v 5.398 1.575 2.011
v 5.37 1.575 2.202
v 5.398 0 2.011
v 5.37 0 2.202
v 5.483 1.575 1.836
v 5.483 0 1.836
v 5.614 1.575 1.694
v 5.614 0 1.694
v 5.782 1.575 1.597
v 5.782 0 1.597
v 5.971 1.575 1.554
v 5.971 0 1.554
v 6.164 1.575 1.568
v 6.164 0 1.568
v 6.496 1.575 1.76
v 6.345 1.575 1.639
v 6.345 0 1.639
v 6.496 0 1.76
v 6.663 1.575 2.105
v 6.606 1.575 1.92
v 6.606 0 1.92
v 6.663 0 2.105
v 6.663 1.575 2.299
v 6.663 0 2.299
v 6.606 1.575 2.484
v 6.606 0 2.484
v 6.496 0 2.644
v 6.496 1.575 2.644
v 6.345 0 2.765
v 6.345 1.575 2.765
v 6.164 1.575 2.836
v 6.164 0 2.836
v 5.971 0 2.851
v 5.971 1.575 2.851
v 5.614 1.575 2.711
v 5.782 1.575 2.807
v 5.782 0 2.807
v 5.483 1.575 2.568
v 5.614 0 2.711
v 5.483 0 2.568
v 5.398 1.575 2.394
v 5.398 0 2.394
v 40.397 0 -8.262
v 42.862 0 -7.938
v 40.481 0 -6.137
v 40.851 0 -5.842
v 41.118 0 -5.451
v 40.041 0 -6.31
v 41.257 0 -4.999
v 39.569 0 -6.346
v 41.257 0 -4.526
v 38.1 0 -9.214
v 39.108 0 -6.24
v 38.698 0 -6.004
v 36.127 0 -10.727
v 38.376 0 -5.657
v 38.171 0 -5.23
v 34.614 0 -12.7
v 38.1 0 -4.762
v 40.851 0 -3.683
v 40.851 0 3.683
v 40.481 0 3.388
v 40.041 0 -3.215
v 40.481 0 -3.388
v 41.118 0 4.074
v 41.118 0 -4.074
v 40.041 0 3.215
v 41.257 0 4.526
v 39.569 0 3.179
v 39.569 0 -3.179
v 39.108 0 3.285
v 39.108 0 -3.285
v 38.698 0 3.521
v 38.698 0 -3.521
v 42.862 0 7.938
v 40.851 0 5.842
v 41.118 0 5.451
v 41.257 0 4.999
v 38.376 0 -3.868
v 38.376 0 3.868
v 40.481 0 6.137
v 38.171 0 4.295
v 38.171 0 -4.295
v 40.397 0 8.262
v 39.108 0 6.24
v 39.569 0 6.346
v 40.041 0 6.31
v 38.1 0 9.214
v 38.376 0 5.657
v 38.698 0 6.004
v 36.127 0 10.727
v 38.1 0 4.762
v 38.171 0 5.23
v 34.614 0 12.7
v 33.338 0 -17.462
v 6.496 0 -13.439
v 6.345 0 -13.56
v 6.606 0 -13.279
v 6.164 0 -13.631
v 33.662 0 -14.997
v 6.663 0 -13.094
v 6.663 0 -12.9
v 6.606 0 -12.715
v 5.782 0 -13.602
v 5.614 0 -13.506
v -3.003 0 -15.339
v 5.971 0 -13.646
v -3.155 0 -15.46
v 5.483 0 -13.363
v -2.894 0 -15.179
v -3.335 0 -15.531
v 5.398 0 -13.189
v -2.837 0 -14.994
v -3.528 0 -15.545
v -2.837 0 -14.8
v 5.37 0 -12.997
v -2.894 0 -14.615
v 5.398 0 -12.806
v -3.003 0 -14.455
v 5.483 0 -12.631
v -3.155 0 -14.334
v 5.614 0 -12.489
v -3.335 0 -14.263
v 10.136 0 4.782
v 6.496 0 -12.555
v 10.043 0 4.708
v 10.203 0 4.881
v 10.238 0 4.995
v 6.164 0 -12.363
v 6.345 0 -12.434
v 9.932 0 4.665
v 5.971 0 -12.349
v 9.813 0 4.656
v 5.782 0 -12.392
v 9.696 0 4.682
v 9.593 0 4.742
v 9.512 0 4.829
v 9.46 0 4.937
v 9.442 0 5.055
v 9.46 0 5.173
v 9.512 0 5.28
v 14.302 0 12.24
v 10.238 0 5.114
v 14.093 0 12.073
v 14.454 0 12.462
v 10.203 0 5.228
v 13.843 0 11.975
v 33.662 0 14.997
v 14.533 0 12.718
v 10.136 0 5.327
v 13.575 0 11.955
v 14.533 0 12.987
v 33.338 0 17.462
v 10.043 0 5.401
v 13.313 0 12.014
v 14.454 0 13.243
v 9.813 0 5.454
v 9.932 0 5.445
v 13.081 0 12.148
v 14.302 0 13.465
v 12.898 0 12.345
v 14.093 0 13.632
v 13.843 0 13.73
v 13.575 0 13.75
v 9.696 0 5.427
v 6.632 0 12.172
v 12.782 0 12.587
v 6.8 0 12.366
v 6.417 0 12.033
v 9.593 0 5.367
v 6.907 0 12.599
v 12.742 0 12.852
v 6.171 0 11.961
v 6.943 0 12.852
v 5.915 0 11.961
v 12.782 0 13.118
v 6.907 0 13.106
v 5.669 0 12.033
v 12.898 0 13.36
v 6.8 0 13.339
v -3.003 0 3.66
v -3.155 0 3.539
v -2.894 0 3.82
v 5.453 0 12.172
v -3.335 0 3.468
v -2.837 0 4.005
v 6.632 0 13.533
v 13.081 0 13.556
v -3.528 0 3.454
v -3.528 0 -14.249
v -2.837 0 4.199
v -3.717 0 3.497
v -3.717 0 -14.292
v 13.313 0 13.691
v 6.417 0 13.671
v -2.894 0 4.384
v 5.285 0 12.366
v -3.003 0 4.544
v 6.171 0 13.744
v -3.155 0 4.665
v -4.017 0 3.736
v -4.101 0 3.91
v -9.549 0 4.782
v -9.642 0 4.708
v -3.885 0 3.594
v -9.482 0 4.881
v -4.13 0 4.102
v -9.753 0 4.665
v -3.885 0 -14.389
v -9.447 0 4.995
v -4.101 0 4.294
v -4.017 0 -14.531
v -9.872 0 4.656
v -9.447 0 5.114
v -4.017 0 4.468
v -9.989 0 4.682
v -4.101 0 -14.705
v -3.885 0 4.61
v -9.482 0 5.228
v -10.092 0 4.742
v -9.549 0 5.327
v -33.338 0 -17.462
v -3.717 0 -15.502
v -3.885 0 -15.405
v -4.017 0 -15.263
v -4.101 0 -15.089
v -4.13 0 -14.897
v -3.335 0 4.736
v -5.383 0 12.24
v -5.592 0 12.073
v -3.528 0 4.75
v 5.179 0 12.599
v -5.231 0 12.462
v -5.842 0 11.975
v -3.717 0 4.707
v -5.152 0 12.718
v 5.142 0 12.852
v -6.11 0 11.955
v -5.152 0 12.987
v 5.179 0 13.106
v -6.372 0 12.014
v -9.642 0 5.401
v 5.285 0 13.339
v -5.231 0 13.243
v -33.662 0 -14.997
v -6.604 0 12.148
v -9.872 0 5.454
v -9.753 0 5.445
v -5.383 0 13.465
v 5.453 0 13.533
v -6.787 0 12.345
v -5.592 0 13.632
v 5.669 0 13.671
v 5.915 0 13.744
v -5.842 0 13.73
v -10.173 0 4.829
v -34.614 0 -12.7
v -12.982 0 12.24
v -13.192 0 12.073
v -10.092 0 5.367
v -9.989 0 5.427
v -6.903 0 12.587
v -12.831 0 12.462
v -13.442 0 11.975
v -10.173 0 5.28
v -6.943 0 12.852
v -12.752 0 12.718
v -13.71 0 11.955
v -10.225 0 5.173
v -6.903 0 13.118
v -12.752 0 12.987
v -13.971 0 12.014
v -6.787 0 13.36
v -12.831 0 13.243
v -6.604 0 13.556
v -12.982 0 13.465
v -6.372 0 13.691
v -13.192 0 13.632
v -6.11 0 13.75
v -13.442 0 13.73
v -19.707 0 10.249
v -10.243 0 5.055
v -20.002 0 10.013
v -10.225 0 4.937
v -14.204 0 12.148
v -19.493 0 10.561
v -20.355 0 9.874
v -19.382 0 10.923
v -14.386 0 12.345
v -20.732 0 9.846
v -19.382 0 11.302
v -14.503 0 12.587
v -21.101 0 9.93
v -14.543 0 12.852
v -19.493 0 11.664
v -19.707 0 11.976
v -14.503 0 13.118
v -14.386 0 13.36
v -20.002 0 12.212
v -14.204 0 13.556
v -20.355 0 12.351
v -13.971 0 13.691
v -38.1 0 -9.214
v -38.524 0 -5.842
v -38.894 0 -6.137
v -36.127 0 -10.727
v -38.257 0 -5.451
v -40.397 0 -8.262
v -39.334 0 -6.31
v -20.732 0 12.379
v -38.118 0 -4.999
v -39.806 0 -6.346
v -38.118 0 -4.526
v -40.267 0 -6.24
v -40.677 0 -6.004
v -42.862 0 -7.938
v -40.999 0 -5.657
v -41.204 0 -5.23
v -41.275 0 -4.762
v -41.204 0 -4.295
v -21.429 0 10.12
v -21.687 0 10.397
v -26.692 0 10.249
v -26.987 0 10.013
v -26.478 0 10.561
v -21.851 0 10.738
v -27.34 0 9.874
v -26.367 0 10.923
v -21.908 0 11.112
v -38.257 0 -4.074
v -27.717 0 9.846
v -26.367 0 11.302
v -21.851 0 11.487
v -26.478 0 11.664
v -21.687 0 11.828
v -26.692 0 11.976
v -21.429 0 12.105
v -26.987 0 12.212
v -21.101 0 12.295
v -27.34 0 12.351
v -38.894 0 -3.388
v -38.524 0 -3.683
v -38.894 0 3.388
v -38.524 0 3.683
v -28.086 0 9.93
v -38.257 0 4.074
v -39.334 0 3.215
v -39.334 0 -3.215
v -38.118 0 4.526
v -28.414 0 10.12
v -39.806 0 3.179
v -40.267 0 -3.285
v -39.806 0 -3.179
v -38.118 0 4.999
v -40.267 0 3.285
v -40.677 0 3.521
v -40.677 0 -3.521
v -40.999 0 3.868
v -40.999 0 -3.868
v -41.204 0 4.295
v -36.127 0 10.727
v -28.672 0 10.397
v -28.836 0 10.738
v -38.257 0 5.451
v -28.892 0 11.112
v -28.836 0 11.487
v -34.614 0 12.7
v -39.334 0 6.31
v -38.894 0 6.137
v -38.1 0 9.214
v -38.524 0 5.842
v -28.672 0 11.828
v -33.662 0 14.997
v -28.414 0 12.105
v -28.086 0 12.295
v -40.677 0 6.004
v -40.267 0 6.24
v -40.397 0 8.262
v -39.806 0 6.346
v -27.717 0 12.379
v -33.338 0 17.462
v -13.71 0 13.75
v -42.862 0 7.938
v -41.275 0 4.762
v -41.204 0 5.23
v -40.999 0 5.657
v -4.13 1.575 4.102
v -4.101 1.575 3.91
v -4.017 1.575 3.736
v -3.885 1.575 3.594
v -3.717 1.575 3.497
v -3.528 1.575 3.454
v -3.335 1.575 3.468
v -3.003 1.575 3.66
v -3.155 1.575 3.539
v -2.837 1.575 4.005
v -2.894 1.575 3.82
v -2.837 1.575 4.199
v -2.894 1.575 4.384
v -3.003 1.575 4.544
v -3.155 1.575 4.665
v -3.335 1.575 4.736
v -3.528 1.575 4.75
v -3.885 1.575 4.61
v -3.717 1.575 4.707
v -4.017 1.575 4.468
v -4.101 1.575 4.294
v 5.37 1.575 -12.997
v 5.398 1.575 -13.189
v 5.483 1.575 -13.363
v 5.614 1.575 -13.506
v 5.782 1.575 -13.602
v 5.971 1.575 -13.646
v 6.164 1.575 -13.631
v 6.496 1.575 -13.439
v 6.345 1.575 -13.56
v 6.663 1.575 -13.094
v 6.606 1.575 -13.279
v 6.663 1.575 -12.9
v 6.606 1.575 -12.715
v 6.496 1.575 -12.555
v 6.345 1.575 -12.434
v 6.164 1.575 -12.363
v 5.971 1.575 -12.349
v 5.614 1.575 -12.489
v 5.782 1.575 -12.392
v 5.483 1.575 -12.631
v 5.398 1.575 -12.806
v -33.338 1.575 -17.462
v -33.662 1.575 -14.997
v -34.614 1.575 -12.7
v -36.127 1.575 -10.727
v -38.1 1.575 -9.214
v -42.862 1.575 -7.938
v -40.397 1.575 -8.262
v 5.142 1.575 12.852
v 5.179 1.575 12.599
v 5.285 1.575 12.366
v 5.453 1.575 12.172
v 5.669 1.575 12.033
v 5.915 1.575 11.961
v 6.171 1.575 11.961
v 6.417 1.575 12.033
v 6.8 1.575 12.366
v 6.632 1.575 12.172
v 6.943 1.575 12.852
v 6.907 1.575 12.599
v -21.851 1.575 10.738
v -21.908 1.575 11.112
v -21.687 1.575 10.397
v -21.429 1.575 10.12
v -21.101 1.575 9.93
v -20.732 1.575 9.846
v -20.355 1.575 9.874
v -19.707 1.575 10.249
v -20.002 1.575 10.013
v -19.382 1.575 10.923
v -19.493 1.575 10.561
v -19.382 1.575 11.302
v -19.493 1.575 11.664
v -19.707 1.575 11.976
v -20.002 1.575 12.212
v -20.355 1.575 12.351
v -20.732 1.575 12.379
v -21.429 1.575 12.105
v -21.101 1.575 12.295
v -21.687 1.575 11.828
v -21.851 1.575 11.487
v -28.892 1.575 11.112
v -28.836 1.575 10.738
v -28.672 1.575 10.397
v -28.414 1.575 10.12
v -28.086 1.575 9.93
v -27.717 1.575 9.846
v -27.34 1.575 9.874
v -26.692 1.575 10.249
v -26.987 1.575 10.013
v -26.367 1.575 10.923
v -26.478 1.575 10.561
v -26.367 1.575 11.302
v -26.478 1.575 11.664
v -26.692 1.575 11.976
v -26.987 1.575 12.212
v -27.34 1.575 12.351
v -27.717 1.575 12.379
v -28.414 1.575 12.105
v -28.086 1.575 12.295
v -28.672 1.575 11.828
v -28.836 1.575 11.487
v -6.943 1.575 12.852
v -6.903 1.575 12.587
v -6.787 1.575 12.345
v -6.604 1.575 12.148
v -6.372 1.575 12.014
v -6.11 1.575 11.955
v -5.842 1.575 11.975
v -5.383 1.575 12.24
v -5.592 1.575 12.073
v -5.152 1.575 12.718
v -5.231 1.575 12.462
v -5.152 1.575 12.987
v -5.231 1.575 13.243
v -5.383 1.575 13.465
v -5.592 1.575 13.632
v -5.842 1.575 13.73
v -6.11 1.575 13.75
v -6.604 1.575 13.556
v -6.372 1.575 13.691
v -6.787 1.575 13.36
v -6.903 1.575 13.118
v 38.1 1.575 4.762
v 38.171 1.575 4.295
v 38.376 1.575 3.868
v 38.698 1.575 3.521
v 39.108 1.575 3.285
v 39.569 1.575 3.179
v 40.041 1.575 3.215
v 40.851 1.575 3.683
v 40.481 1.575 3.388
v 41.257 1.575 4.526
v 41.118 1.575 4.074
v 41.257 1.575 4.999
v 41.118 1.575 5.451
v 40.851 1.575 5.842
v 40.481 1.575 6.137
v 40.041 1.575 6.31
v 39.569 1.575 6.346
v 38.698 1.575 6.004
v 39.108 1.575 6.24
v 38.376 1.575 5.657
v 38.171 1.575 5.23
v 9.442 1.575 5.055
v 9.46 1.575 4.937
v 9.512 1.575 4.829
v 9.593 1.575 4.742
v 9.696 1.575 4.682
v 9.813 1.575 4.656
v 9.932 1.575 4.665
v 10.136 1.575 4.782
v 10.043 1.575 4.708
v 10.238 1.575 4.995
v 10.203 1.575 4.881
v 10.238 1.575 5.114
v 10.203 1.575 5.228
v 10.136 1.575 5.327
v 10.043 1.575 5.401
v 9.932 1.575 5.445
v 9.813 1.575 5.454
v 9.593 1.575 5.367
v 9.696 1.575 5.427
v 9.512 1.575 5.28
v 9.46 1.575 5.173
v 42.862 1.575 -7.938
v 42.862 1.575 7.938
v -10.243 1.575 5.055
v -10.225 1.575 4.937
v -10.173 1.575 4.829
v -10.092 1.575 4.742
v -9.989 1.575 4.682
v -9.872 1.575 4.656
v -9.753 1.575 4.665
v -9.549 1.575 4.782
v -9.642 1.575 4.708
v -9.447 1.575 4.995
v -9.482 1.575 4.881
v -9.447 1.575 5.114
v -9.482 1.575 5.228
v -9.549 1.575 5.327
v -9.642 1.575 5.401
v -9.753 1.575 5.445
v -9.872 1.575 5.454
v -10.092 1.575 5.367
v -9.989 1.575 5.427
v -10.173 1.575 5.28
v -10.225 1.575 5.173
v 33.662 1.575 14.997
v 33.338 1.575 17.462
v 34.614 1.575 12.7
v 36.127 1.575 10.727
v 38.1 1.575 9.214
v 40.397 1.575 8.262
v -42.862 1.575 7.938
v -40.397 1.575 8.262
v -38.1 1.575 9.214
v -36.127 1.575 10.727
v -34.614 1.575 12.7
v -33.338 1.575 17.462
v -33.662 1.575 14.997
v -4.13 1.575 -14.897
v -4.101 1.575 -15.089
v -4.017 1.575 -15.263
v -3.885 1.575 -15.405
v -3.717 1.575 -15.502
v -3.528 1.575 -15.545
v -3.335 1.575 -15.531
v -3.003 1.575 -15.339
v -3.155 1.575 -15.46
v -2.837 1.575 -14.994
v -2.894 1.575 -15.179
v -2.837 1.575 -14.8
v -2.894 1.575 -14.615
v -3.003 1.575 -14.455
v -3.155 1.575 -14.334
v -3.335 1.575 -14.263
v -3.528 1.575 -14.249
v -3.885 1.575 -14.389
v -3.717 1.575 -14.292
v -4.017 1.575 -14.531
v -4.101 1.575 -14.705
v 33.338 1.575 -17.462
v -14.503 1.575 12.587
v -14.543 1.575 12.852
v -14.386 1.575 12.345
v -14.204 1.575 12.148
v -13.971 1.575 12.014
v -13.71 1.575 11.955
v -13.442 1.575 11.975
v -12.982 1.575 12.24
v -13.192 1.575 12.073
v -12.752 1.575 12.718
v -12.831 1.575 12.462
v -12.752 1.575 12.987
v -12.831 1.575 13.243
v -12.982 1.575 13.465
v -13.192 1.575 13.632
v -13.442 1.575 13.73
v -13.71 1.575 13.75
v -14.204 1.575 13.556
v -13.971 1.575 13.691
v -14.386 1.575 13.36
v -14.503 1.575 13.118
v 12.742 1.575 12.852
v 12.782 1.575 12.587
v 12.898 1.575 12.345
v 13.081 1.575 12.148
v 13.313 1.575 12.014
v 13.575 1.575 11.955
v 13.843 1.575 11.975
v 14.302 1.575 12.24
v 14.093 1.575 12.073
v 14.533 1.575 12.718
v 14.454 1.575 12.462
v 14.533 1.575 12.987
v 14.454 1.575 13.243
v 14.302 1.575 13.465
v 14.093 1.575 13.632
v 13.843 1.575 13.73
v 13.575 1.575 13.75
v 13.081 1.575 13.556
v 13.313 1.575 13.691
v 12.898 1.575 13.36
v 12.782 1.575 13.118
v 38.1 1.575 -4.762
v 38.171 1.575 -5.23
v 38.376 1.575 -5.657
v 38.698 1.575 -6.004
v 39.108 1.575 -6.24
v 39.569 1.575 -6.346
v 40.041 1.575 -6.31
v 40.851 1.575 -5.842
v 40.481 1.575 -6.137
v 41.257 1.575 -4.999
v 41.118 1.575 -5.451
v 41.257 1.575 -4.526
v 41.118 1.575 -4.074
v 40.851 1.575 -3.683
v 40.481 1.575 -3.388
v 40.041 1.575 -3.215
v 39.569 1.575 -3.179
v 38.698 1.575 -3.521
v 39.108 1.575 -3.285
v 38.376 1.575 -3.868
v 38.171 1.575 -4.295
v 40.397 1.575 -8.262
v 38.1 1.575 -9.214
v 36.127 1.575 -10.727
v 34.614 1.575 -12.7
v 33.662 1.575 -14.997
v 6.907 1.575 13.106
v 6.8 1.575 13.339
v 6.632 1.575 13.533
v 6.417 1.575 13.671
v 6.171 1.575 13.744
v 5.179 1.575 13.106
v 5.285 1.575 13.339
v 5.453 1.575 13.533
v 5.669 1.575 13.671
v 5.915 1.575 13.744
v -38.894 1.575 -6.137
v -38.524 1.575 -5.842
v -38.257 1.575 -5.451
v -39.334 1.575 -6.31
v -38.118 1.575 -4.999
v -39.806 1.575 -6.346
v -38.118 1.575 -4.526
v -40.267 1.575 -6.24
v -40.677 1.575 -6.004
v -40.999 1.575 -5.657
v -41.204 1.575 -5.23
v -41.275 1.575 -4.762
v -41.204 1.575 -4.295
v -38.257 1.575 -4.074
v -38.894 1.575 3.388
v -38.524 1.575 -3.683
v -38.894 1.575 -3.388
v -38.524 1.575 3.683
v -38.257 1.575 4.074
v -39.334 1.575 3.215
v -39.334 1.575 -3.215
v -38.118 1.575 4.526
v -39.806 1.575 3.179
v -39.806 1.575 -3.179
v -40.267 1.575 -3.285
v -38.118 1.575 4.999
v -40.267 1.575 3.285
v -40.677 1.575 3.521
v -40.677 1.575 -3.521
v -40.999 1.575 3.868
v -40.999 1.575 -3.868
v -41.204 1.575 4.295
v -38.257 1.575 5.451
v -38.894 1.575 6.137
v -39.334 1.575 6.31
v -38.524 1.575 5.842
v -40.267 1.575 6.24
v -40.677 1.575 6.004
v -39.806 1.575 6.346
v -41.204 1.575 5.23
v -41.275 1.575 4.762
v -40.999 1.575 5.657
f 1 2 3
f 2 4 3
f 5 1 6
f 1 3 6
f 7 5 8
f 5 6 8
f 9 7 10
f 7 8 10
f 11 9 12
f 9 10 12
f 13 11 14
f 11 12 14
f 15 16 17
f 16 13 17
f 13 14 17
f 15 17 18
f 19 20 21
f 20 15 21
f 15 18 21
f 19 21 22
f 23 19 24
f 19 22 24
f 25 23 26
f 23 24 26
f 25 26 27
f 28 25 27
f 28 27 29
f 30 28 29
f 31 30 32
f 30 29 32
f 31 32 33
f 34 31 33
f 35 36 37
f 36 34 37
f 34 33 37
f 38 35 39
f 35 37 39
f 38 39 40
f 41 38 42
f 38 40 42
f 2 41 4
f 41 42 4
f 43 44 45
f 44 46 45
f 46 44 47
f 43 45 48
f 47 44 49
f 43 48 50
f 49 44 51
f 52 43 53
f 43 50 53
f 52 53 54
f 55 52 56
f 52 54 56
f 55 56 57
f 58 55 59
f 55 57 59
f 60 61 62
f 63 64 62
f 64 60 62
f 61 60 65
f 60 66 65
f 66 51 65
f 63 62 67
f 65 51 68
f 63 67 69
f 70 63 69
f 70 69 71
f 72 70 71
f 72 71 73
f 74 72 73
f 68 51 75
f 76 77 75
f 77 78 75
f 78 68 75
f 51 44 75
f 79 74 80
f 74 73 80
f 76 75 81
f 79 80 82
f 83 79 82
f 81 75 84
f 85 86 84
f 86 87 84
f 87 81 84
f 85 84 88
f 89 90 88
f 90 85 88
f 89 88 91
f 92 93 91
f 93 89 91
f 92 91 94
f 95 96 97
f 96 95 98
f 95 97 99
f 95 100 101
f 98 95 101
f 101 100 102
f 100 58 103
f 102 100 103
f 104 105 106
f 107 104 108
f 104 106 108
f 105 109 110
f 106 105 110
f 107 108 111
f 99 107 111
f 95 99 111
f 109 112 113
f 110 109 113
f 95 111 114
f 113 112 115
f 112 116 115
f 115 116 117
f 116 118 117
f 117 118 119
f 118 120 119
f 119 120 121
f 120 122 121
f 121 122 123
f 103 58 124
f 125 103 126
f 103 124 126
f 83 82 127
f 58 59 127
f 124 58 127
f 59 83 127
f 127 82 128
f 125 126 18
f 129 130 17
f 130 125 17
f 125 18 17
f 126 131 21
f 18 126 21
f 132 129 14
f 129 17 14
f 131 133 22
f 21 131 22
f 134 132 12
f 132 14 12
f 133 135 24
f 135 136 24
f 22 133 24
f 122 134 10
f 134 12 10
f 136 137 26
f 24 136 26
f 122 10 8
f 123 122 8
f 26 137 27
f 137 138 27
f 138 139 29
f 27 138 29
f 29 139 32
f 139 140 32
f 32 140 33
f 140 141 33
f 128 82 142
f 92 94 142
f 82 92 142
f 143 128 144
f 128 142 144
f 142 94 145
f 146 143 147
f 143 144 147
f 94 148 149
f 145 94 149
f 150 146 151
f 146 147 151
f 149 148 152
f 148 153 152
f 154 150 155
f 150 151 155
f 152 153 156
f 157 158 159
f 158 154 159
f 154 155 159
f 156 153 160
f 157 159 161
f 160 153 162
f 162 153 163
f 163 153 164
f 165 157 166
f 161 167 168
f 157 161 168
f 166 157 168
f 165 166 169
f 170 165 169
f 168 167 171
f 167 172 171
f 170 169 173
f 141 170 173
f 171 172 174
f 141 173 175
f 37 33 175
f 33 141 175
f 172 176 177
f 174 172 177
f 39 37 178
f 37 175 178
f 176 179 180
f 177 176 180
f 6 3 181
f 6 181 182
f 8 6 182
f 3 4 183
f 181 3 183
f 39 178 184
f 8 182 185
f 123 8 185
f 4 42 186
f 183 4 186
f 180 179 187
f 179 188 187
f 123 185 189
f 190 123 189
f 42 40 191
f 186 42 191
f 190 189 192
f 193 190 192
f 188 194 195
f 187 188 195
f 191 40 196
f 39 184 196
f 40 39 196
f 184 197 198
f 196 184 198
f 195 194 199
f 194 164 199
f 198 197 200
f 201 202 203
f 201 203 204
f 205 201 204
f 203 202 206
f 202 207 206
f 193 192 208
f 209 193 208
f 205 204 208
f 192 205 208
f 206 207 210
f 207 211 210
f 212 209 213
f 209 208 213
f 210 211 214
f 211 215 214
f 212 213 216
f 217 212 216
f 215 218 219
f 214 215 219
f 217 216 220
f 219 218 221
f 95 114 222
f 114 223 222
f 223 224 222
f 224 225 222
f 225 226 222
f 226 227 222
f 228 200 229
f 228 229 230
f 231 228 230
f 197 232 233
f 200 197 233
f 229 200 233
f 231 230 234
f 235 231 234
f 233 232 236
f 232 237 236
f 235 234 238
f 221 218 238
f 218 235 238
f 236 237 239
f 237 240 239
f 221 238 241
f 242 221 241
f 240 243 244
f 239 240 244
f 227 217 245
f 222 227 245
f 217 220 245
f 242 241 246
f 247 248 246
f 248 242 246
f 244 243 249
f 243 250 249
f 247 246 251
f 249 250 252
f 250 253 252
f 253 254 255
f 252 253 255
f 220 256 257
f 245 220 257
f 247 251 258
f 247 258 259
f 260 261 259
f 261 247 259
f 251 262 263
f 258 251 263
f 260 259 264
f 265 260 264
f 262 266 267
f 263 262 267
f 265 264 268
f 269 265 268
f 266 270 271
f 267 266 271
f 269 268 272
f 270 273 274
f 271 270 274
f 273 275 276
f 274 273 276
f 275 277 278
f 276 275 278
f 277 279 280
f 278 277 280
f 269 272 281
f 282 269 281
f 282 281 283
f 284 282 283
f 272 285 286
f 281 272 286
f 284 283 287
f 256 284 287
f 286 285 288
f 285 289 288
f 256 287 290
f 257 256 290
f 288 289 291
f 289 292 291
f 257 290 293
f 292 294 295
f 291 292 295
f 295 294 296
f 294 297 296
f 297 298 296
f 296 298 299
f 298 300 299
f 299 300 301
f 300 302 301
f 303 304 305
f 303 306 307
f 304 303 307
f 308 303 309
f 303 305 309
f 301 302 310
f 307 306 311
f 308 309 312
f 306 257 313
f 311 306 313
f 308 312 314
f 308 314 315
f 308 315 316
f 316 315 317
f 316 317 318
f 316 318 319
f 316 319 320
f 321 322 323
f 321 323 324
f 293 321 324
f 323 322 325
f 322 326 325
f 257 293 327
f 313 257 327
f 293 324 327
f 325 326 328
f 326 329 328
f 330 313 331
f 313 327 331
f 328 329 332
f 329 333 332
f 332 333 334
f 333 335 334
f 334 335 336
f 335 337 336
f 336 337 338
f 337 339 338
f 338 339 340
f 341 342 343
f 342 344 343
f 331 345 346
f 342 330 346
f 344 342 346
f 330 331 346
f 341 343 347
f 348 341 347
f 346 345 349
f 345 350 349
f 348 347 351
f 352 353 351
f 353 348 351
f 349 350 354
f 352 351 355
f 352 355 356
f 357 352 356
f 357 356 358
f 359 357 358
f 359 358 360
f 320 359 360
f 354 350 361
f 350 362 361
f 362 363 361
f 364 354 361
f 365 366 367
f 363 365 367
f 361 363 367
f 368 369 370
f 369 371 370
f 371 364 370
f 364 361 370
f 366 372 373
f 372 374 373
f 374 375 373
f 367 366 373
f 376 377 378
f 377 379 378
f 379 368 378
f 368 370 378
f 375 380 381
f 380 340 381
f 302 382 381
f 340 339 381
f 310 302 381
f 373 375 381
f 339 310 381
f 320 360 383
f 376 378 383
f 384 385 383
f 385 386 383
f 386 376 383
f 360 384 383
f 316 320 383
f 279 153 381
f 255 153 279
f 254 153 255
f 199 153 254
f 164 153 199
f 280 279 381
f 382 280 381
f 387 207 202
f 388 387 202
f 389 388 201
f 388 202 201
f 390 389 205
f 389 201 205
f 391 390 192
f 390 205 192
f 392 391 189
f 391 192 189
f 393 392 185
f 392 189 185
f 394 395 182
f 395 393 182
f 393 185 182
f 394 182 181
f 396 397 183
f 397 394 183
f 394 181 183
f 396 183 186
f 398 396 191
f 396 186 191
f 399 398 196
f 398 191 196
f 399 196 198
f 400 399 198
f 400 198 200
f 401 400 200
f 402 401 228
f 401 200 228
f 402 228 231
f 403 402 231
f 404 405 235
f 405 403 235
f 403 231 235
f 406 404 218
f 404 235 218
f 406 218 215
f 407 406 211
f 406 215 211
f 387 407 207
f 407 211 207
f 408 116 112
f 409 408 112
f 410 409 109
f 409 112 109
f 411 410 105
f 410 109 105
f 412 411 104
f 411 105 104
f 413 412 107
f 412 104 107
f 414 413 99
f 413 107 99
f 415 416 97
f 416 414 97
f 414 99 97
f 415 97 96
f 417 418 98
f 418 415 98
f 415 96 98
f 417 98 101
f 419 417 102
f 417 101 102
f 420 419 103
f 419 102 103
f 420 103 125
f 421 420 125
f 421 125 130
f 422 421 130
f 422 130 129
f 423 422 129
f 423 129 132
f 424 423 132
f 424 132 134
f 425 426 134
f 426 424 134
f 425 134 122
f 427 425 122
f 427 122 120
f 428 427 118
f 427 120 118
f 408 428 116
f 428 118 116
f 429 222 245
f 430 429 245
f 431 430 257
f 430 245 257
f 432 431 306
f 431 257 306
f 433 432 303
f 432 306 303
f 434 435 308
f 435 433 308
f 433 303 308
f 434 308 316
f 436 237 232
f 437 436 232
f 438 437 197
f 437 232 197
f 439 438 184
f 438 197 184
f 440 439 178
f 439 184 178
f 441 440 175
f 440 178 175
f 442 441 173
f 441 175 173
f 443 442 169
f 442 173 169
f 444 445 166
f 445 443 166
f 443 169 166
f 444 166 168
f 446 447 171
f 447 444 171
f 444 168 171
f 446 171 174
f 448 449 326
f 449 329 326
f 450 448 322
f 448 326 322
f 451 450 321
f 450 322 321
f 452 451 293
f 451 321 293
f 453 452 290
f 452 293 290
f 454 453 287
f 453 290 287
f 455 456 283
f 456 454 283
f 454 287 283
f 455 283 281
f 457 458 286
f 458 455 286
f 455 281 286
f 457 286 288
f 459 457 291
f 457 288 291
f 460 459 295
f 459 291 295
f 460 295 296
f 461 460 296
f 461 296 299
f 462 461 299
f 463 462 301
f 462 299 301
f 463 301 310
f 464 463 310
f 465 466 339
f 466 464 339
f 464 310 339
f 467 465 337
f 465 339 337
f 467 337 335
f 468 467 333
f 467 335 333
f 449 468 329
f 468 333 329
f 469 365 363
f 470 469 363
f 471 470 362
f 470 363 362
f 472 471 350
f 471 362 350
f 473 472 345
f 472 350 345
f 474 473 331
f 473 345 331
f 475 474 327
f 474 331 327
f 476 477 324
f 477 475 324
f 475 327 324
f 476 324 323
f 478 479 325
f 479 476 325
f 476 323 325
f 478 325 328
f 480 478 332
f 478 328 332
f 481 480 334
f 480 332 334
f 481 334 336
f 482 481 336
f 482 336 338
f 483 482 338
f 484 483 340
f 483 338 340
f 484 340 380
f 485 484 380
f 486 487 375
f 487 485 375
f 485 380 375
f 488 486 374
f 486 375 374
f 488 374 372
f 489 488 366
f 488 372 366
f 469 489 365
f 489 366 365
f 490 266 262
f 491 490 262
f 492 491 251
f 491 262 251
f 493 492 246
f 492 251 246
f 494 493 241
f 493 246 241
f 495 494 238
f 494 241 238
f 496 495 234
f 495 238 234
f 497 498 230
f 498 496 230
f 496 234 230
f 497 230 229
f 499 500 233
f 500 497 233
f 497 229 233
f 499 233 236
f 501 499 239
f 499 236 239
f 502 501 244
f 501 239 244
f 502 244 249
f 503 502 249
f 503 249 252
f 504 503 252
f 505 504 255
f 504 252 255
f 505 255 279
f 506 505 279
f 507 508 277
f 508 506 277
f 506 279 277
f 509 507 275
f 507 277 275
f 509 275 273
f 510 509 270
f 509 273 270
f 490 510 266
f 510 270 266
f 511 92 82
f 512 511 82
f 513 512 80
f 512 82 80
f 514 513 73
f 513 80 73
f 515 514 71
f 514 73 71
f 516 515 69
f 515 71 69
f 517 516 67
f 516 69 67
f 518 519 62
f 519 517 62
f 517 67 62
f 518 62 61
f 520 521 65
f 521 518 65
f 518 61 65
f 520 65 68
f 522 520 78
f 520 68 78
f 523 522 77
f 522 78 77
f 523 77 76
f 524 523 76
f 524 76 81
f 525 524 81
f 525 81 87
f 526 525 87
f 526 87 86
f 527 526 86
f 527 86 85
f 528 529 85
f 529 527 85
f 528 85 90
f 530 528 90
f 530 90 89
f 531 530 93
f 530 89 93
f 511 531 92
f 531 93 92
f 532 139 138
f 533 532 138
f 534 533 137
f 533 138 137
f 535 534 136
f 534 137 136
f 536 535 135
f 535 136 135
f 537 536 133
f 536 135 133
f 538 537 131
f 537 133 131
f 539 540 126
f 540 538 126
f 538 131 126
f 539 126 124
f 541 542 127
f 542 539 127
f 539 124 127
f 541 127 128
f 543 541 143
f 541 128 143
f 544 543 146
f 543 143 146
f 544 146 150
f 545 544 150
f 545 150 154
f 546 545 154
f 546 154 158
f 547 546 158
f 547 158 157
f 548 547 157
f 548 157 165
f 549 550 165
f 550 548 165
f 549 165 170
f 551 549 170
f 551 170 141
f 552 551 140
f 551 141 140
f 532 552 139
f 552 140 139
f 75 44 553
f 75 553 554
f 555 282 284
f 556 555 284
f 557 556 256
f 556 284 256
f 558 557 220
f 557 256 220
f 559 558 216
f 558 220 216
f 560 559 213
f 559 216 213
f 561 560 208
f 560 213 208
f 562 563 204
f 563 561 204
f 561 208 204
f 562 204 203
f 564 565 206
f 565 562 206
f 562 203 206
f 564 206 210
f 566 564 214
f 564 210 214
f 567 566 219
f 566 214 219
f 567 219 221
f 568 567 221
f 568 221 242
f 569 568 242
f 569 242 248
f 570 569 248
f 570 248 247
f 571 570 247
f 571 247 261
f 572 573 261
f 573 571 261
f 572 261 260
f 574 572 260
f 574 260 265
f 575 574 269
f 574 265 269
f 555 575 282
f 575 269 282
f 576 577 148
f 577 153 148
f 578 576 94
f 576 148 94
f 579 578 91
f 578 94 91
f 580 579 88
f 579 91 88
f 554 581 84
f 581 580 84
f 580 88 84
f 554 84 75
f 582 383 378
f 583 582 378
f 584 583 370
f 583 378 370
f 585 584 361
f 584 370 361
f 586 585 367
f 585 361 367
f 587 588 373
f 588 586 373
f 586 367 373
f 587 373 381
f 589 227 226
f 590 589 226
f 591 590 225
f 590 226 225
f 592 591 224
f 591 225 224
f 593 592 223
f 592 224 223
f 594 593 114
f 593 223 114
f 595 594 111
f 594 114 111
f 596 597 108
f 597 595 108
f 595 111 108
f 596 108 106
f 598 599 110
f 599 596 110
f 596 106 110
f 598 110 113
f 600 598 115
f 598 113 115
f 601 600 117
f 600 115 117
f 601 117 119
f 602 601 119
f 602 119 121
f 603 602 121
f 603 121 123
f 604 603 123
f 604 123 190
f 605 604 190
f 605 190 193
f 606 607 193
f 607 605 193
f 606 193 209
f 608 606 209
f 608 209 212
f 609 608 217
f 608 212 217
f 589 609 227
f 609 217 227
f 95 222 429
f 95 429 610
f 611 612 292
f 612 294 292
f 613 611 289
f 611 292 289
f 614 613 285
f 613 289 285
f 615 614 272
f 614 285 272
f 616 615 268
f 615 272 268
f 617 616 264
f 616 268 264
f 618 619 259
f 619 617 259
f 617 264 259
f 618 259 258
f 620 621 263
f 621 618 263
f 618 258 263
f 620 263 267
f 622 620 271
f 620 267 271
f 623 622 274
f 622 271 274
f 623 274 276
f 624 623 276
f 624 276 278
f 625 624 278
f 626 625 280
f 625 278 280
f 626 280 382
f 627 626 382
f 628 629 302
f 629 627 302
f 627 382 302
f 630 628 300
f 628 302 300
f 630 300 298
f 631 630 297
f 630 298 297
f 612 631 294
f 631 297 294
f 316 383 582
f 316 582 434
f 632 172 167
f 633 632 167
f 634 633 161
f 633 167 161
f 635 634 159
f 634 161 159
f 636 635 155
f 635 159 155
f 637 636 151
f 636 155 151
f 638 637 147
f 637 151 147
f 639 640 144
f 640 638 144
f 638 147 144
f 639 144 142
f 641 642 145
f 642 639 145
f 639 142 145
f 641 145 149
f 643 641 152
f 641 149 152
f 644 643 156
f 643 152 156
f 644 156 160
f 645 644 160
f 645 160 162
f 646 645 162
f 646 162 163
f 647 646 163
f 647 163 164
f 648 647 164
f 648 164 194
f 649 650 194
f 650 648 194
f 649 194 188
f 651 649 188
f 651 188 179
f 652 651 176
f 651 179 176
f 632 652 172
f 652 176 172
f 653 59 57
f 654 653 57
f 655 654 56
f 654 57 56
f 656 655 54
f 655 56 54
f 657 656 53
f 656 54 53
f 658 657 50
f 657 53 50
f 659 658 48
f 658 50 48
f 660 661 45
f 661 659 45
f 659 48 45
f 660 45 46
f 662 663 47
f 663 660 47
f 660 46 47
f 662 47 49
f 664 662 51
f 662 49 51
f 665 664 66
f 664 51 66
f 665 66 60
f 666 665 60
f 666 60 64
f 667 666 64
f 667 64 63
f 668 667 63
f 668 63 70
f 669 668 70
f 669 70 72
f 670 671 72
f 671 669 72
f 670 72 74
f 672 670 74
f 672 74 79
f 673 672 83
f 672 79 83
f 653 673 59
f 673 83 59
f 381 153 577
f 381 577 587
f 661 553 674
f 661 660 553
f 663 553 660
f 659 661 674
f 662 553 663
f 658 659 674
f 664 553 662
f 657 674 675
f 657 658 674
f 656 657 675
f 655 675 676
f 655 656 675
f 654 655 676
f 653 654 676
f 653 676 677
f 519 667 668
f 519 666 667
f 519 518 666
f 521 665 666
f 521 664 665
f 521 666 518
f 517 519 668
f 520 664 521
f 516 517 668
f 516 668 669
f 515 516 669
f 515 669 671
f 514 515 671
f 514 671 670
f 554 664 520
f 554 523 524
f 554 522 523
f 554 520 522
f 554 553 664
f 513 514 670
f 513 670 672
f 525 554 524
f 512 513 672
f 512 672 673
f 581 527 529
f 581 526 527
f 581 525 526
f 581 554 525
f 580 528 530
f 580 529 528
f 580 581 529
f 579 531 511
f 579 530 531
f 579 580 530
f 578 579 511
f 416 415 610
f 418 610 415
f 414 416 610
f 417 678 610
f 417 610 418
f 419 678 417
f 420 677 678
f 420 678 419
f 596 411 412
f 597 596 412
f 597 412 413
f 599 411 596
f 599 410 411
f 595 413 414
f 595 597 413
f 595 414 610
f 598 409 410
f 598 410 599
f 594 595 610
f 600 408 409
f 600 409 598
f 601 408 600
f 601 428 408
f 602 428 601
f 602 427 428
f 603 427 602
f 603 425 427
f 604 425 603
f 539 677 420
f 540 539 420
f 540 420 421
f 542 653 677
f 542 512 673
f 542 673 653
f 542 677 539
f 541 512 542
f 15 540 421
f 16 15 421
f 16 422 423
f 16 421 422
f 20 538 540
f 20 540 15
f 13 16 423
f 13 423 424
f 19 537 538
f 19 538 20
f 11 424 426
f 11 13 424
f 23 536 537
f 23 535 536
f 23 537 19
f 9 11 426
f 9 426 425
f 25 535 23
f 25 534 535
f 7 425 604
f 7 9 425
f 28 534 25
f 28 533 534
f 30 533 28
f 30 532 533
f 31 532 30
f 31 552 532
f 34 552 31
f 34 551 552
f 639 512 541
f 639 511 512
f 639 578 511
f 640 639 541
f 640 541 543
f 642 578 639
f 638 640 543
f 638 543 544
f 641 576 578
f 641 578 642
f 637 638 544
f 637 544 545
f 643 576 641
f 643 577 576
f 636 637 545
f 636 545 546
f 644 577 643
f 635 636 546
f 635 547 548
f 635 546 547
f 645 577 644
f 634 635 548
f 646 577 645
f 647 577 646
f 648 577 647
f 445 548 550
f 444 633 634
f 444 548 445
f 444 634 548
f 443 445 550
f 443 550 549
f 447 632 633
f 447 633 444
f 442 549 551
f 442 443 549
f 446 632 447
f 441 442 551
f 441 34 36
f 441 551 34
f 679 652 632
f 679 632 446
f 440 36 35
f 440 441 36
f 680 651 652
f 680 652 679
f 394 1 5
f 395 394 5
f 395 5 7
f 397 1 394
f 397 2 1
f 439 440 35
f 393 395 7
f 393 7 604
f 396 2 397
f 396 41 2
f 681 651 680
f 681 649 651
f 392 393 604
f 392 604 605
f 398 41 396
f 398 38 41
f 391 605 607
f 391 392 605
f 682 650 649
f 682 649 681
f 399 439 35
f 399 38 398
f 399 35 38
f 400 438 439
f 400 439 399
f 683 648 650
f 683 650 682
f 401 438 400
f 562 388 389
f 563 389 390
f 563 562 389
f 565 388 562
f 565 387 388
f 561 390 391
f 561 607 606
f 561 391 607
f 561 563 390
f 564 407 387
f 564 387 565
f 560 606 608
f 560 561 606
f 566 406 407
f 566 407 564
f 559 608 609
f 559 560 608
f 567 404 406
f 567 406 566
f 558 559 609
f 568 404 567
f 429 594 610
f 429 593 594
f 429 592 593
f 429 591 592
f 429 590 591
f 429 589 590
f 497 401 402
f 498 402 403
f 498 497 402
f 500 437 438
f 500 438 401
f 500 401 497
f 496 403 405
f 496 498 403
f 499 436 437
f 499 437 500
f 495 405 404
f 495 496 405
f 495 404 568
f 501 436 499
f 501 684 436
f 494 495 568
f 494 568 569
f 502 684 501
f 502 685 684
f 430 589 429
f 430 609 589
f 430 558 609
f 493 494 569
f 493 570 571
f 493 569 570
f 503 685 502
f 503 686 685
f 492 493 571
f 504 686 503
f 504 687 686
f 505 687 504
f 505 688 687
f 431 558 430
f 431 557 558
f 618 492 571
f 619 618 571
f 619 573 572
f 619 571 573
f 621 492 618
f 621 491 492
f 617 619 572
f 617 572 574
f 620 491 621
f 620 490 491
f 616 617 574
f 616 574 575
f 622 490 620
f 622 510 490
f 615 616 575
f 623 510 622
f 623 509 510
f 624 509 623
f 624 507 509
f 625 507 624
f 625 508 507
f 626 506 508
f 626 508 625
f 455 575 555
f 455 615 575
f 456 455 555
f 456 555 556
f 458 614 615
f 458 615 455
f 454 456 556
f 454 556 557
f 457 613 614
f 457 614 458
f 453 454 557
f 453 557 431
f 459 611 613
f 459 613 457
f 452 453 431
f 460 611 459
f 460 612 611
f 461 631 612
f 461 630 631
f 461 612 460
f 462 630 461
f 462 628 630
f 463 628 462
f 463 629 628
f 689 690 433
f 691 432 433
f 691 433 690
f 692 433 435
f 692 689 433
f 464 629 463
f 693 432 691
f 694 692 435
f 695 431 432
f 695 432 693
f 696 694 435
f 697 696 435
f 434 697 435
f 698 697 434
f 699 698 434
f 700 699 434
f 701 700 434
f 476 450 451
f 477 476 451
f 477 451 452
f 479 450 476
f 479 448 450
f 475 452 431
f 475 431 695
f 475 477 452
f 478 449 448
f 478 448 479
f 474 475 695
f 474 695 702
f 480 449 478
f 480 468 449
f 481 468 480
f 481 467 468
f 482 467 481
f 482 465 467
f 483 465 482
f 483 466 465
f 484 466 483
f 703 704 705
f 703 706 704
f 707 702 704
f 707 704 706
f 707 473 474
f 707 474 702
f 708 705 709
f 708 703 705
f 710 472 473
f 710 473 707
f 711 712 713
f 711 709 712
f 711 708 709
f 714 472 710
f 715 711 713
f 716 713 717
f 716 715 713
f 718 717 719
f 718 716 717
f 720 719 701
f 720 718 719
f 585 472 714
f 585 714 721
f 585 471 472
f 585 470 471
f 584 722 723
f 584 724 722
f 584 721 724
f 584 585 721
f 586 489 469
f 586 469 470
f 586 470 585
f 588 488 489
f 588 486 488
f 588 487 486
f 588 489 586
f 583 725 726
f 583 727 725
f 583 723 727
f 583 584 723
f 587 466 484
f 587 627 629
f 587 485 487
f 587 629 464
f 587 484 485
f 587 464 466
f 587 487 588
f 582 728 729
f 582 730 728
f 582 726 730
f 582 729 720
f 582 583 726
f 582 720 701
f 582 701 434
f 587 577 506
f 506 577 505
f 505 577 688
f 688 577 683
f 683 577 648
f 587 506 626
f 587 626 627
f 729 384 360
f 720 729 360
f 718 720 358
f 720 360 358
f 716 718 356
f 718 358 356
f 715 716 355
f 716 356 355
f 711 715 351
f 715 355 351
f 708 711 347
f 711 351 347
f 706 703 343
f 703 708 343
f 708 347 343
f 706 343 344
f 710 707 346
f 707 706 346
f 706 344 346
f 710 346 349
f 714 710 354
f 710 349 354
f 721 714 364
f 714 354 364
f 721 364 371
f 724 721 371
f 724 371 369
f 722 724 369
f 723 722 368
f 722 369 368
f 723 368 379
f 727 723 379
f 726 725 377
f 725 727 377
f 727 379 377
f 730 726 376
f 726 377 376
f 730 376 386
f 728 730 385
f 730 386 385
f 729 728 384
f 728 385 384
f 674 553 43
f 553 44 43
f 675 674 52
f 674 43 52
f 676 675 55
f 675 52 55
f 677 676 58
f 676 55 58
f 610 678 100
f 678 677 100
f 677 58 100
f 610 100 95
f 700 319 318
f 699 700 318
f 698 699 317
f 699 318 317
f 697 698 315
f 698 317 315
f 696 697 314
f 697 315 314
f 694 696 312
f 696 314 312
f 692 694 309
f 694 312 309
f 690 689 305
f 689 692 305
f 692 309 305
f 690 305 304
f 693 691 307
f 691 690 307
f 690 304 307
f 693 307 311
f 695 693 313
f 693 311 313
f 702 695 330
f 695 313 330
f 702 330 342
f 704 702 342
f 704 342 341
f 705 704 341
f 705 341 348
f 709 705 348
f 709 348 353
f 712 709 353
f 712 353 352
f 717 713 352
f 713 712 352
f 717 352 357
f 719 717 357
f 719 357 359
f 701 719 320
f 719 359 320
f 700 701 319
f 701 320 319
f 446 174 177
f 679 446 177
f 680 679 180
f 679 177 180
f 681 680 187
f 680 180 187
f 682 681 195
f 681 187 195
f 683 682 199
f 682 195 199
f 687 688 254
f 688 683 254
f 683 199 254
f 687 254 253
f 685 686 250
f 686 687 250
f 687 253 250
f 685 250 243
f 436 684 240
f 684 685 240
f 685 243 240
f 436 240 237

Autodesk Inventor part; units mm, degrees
ref_plane "YZ Plane" through (0, 0, 0) normal (1, 0, 0) x (0, 1, 0)
ref_plane "XZ Plane" through (0, 0, 0) normal (0, 1, 0) x (-1, 0, 0)
ref_plane "XY Plane" through (0, 0, 0) normal (0, 0, 1) x (1, 0, 0)
sketch "Sketch1" plane through (0, 0, 0) normal (0, 1, 0) x (-1, 0, 0)
  line L0 (-33.3375, 17.4625) -> (33.3375, 17.4625)
  line L1 (42.8625, 7.9375) -> (42.8625, -7.9375)
  line L2 (33.3375, -17.4625) -> (-33.3375, -17.4625)
  line L3 (-42.8625, -7.9375) -> (-42.8625, 7.9375)
  arc A0 (-42.8625, 7.9375) -> (-33.3375, 17.4625) centre (-42.8625, 17.4625) ccw
  arc A1 (-33.3375, -17.4625) -> (-42.8625, -7.9375) centre (-42.8625, -17.4625) ccw
  arc A2 (42.8625, -7.9375) -> (33.3375, -17.4625) centre (42.8625, -17.4625) ccw
  arc A3 (33.3375, 17.4625) -> (42.8625, 7.9375) centre (42.8625, 17.4625) ccw
  circle A4 centre (-39.6875, -4.7625) radius 1.5875
  line L4 (0, 15.213) -> (0, -8.9791)
  circle A5 centre (39.6875, -4.7625) radius 1.5875
  line L5 (-13.6455, 0) -> (11.519, 0)
  circle A6 centre (-39.6875, 4.7625) radius 1.5875
  circle A7 centre (39.6875, 4.7625) radius 1.5875
  line L6 (-42.8625, -13.6689) -> (-42.8625, -17.4625)
  line L7 (-42.8625, -17.4625) -> (-40.918, -17.4625)
  circle A8 centre (6.0427, 12.8524) radius 0.9004
  circle A9 centre (13.6423, 12.8524) radius 0.9004
  circle A10 centre (-6.0427, 12.8524) radius 0.9004
  circle A11 centre (-13.6423, 12.8524) radius 0.9004
  circle A12 centre (20.6375, 11.1125) radius 1.27
  circle A13 centre (27.6225, 11.1125) radius 1.27
  circle A14 centre (-9.8425, 5.0546) radius 0.4001
  circle A15 centre (9.8425, 5.0546) radius 0.4001
  circle A16 centre (3.4798, 4.1021) radius 0.6502
  circle A17 centre (-6.0198, -12.9972) radius 0.6502
  circle A18 centre (-6.0198, 2.2022) radius 0.6502
  circle A19 centre (3.4798, -14.8971) radius 0.6502
  line L8 (-13.6423, 12.8524) -> (-6.0427, 12.8524)
  point P0 (0, 0)
  dimension "d3" = 17.4625
  dimension "d4" = 42.8625
  dimension "d5" = 19.05
  dimension "d6" = 19.05
  dimension "d7" = 19.05
  dimension "d8" = 19.05
  dimension "d9" = 85.725
  dimension "d11" = 85.725
  dimension "d12" = 85.725
  dimension "d13" = 17.4625
  dimension "d14" = 17.4625
  dimension "d15" = 42.8625
  dimension "d19" = 34.925
  dimension "d20" = 42.8625
  dimension "d22" = 17.4625
  dimension "d23" = 42.8625
  dimension "d26" = 39.6875
  dimension "d27" = 3.175
  dimension "d28" = 4.7625
  dimension "d29" = 42.8625
  dimension "d30" = 17.4625
  dimension "d31" = 42.8625
  dimension "d32" = 34.925
  dimension "d33" = 1.8009
  dimension "d34" = 48.9052
  dimension "d35" = 30.3149
  dimension "d36" = 1.8009
  dimension "d37" = 1.8009
  dimension "d38" = 1.8009
  dimension "d39" = 30.3149
  dimension "d40" = 30.3149
  dimension "d41" = 30.3149
  dimension "d42" = 29.2202
  dimension "d43" = 36.8198
  dimension "d45" = 6.0427
  dimension "d46" = 6.0427
  dimension "d47" = 2.54
  dimension "d48" = 2.54
  dimension "d49" = 63.5
  dimension "d50" = 70.485
  dimension "d51" = 28.575
  dimension "d52" = 28.575
  dimension "d53" = 0.8001
  dimension "d54" = 0.8001
  dimension "d55" = 33.02
  dimension "d56" = 52.705
  dimension "d57" = 22.5171
  dimension "d58" = 22.5171
  dimension "d59" = 1.3005
  dimension "d61" = 21.5646
  dimension "d62" = 1.3005
  dimension "d63" = 1.3005
  dimension "d64" = 1.3005
  dimension "d65" = 36.8427
  dimension "d66" = 19.6647
  dimension "d67" = 36.8427
  dimension "d68" = 4.4653
  dimension "d69" = 46.3423
  dimension "d70" = 2.5654
  dimension "d73" = 56.5048
  dimension "d74" = 7.5997
  dimension "d75" = 7.5997
  dimension "d76" = 19.685
  dimension "d77" = 46.3423
extrude "Extrusion2" add sketch "Sketch1" along normal blind 1.5748
properties part number "pcb"
